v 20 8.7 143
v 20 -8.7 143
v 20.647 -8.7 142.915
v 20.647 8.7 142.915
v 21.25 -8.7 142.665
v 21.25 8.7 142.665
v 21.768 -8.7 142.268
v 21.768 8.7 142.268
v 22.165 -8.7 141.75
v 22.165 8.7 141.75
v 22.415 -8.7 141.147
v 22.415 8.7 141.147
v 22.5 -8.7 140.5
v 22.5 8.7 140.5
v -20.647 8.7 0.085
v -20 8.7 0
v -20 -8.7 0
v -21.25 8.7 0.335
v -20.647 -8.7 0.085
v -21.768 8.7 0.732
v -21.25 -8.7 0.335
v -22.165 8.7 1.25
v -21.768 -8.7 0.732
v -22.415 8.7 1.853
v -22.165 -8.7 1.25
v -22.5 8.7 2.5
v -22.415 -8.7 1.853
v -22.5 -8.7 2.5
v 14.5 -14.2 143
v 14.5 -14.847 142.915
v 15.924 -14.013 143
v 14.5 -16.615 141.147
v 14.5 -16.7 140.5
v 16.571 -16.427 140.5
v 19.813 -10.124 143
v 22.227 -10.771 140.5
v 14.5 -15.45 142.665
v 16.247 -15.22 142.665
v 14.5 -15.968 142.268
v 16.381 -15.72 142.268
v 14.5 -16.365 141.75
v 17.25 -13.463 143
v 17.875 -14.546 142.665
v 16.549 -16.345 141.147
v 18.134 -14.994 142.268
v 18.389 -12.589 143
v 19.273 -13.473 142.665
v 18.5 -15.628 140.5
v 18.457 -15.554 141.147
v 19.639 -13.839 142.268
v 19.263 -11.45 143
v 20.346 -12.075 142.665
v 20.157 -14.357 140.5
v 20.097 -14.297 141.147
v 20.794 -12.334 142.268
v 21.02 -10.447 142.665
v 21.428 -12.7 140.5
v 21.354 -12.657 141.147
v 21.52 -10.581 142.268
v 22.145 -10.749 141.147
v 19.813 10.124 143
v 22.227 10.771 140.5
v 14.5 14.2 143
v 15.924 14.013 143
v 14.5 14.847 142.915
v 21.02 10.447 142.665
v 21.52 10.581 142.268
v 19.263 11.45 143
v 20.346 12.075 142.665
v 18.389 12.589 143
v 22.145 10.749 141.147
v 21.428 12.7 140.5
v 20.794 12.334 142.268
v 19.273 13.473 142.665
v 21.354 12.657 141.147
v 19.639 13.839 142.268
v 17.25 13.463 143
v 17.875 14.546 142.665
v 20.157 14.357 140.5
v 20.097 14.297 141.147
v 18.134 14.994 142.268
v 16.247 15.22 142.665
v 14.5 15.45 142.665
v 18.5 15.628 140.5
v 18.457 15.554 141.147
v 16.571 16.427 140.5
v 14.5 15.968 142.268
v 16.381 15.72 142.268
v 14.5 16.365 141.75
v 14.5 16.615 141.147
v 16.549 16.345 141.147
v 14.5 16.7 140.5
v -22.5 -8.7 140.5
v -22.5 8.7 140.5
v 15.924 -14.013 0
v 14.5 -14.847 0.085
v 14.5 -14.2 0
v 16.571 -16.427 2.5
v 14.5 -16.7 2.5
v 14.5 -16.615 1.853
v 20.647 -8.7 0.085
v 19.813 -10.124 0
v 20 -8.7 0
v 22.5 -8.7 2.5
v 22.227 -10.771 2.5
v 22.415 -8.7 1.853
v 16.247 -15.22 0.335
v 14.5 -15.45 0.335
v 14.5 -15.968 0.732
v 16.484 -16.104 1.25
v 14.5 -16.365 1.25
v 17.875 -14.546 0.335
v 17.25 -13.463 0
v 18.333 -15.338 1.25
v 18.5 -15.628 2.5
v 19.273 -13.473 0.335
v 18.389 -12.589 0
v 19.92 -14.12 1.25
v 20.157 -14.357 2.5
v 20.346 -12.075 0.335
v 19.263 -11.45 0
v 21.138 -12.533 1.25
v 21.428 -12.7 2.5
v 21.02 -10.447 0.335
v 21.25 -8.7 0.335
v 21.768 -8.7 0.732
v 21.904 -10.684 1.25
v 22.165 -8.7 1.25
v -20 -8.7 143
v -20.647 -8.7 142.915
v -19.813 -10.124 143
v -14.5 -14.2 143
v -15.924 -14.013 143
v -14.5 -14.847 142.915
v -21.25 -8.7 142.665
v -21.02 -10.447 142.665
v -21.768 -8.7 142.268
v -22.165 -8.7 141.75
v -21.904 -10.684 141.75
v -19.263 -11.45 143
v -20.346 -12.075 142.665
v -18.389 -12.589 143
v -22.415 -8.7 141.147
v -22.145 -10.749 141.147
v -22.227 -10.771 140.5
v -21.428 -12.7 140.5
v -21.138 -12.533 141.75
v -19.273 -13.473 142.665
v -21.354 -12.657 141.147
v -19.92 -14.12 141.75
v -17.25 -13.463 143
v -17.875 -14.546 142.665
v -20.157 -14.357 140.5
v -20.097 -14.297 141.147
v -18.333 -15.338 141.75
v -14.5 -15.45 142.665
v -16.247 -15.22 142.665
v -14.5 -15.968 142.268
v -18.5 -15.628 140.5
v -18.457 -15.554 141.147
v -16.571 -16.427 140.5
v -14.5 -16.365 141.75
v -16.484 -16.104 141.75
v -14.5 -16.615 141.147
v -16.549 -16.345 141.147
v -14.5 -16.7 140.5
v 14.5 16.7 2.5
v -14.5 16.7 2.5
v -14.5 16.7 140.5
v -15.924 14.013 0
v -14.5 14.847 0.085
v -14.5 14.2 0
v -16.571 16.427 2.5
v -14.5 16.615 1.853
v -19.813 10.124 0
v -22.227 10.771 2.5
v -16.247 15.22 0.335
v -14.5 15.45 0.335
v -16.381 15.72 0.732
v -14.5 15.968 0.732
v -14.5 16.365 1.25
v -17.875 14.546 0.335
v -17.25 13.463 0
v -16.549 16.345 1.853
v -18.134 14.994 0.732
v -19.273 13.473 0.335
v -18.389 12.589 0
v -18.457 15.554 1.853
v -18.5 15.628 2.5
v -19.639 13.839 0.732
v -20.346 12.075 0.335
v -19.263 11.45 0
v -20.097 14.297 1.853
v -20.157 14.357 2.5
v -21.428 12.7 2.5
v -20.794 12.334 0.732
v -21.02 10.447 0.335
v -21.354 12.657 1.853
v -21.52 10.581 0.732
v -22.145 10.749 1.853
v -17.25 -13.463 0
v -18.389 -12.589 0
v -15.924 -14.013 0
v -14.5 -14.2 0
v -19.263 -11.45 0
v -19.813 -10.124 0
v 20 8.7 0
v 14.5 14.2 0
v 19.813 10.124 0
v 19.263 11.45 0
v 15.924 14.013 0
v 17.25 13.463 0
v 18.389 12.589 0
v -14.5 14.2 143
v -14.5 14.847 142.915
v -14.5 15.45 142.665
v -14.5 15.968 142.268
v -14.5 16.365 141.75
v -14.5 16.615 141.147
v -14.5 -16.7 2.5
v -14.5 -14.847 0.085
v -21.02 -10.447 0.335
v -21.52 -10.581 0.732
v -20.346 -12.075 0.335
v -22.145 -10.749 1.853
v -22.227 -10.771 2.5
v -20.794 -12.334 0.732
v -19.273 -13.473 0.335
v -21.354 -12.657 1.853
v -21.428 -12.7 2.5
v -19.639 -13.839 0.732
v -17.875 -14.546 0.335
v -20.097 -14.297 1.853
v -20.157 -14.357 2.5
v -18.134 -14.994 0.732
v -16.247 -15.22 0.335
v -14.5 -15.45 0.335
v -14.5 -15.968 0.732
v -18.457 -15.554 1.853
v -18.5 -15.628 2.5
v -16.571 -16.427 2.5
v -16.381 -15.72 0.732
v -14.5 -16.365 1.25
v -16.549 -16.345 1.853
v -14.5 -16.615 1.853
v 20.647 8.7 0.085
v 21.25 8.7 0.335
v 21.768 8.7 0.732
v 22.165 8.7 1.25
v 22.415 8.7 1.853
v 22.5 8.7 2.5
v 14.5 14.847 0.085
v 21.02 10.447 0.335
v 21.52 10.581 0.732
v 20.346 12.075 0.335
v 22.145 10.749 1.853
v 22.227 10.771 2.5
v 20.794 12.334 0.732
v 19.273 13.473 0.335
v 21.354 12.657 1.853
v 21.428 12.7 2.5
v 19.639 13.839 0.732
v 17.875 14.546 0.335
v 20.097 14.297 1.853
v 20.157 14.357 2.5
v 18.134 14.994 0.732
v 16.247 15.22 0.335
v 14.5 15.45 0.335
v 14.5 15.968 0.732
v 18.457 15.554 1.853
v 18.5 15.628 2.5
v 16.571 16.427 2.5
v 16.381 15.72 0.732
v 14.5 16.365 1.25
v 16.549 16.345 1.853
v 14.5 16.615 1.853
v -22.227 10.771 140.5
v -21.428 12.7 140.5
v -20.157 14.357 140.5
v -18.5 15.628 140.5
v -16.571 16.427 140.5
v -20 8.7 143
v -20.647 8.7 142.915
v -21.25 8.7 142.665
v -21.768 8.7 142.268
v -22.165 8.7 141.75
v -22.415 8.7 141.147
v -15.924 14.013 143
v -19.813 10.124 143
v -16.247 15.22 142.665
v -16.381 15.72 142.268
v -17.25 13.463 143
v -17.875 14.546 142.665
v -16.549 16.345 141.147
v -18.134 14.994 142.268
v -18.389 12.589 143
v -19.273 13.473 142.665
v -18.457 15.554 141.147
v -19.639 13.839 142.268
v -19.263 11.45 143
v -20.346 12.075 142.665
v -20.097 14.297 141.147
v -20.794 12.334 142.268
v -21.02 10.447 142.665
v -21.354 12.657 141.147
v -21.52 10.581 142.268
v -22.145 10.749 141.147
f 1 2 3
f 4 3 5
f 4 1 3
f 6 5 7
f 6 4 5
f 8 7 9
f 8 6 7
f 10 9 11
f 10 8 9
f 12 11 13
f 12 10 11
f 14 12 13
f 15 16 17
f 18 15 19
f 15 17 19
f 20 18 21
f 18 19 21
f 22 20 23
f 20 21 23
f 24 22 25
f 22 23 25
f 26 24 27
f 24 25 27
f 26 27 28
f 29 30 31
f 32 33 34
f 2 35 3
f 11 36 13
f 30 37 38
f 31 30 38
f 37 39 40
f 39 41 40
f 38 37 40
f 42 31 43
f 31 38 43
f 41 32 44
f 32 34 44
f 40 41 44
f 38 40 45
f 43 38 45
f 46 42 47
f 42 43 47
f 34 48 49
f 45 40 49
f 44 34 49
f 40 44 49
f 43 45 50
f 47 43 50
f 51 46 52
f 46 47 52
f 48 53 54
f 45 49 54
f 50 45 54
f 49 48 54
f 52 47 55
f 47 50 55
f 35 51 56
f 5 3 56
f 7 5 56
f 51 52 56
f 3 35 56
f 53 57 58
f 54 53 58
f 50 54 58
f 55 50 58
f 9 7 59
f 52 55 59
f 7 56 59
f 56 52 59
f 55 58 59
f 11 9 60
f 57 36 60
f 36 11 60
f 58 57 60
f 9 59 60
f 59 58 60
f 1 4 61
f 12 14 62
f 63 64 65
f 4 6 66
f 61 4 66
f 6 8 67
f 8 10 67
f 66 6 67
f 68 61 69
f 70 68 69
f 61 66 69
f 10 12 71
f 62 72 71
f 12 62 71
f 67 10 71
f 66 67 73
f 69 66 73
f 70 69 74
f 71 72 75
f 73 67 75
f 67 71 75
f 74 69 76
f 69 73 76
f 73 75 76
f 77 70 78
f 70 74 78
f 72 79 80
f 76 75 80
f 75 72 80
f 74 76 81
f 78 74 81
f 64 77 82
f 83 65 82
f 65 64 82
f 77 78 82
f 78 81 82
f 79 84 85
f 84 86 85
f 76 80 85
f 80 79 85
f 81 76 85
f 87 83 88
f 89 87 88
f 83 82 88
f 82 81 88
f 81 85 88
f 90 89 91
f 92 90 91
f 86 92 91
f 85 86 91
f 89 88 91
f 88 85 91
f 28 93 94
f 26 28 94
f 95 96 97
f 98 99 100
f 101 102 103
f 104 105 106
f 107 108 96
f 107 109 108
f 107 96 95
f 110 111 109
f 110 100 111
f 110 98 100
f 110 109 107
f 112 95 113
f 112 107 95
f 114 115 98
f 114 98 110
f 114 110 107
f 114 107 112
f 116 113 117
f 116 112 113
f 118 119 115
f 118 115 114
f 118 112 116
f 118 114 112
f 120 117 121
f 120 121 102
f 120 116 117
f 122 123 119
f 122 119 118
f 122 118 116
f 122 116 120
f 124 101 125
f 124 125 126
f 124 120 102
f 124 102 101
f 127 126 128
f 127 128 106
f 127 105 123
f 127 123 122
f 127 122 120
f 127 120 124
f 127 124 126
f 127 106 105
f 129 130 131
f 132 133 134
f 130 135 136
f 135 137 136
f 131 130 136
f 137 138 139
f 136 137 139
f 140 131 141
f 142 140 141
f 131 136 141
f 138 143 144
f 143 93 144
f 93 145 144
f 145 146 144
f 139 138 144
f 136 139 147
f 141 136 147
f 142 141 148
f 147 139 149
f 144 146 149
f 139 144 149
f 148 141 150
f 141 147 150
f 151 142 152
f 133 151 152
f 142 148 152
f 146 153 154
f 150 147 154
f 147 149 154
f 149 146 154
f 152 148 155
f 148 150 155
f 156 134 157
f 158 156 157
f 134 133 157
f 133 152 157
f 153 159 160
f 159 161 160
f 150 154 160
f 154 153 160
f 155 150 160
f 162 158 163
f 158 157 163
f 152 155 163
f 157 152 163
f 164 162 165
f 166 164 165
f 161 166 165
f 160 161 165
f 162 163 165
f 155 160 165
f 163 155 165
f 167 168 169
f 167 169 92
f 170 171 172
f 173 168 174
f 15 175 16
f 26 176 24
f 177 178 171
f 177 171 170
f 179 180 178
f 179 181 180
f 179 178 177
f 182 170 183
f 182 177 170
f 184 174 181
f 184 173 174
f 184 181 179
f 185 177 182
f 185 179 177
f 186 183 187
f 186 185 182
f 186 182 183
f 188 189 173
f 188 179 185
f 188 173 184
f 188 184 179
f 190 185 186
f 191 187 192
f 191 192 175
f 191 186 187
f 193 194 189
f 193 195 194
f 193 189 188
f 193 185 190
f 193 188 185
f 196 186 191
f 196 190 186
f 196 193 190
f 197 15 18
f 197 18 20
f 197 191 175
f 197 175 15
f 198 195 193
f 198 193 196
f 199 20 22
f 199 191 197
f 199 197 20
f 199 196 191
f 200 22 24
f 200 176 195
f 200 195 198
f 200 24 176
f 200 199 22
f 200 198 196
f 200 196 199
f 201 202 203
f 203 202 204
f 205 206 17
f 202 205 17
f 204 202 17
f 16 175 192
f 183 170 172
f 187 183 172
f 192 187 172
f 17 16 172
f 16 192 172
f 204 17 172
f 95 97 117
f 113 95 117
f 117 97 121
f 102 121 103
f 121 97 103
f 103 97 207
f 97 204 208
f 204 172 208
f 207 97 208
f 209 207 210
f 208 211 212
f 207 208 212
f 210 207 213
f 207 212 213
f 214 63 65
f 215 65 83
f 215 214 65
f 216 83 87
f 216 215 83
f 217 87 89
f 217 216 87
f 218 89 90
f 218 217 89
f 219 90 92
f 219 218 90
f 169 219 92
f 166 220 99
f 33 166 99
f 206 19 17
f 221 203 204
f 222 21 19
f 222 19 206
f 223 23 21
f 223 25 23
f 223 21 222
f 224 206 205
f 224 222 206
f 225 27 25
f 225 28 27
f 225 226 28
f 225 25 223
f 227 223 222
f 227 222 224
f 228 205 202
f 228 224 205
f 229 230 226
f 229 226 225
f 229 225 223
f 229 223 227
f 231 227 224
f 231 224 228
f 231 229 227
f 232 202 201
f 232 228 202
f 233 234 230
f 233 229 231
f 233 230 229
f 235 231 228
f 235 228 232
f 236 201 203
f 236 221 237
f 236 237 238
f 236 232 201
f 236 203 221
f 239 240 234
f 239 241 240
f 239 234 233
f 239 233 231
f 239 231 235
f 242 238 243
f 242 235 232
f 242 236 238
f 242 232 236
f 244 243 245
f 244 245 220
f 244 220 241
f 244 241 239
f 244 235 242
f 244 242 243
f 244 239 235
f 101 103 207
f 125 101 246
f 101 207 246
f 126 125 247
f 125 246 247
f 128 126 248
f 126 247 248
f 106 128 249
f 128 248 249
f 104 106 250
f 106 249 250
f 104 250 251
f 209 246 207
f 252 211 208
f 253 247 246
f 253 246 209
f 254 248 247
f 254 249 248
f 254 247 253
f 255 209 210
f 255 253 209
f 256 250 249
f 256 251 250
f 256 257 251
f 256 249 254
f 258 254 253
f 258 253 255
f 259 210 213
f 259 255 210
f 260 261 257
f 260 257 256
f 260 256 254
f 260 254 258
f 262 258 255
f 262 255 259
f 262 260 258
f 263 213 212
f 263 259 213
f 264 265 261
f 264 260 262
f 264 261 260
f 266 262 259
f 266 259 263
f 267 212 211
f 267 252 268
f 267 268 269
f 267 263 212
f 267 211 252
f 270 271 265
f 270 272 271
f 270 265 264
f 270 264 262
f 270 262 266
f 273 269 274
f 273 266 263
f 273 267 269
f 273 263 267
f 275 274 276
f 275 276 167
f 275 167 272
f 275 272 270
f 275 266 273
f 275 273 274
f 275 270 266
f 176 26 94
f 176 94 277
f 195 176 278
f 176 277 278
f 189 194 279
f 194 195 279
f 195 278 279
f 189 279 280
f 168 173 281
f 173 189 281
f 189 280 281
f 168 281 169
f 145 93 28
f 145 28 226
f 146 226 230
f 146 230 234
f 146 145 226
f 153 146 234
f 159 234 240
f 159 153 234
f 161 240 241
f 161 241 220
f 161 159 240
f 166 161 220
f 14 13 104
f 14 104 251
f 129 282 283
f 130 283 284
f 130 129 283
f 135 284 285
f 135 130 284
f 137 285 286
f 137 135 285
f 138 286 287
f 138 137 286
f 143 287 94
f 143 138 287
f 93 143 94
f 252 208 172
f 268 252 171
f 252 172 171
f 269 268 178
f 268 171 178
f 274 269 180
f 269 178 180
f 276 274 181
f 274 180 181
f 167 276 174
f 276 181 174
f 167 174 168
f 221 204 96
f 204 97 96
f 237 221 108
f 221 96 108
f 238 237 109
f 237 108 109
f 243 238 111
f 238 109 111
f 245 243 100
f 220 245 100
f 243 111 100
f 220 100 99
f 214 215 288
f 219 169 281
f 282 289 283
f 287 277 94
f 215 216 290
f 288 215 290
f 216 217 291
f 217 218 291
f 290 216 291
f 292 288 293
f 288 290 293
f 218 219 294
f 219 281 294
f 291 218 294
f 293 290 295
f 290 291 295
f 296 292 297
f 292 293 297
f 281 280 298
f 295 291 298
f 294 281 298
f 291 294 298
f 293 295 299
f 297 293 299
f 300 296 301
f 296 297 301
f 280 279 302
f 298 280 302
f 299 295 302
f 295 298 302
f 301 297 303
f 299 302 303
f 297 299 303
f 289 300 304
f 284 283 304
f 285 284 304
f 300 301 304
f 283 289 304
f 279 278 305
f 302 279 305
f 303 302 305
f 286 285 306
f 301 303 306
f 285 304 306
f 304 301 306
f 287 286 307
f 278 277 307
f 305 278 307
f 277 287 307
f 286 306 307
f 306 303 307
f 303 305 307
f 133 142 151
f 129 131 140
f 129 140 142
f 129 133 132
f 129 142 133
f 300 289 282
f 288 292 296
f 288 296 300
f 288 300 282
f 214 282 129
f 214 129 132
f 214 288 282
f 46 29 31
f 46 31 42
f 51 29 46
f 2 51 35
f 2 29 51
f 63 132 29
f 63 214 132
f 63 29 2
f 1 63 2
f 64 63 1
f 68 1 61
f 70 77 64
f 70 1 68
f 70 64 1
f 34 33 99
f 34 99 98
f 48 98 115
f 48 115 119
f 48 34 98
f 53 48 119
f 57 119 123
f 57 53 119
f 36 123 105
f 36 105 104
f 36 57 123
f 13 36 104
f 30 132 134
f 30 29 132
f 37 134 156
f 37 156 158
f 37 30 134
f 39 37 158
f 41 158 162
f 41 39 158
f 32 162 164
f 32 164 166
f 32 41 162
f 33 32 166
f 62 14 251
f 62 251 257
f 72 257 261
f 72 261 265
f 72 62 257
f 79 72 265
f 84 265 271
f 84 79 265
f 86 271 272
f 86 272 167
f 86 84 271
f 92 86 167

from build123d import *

# Parameters (mm, degrees)
SKETCH_W    = 45
SKETCH_H    = 33.4
PAD_DEPTH   = 143
FILLET_R    = 8
FILLET001_R = 2.5


with BuildPart() as part:
    # Sketch → Pad (new body)
    with BuildSketch(Plane.XY):
        Rectangle(SKETCH_W, SKETCH_H)
    extrude(amount=PAD_DEPTH)

    # Fillet
    fillet_edges = [part.edges().sort_by_distance(p)[0] for p in [
        (22.5, -16.7, 71.5),
        (22.5, 16.7, 71.5),
        (-22.5, -16.7, 71.5),
        (-22.5, 16.7, 71.5),
    ]]
    fillet(fillet_edges, radius=FILLET_R)

    # Fillet001
    fillet001_edges = [part.edges().sort_by_distance(p)[0] for p in [
        (0, -16.7, 143),
        (20.156854, -14.356854, 143),
        (22.5, 0, 143),
        (20.156854, 14.356854, 143),
        (0, 16.7, 143),
        (-20.156854, 14.356854, 143),
        (-22.5, 0, 143),
        (-20.156854, -14.356854, 143),
        (20.156854, -14.356854, 0),
        (0, -16.7, 0),
        (-20.156854, -14.356854, 0),
        (-22.5, 0, 0),
        (-20.156854, 14.356854, 0),
        (0, 16.7, 0),
        (20.156854, 14.356854, 0),
        (22.5, 0, 0),
    ]]
    fillet(fillet001_edges, radius=FILLET001_R)


solid = part.part
